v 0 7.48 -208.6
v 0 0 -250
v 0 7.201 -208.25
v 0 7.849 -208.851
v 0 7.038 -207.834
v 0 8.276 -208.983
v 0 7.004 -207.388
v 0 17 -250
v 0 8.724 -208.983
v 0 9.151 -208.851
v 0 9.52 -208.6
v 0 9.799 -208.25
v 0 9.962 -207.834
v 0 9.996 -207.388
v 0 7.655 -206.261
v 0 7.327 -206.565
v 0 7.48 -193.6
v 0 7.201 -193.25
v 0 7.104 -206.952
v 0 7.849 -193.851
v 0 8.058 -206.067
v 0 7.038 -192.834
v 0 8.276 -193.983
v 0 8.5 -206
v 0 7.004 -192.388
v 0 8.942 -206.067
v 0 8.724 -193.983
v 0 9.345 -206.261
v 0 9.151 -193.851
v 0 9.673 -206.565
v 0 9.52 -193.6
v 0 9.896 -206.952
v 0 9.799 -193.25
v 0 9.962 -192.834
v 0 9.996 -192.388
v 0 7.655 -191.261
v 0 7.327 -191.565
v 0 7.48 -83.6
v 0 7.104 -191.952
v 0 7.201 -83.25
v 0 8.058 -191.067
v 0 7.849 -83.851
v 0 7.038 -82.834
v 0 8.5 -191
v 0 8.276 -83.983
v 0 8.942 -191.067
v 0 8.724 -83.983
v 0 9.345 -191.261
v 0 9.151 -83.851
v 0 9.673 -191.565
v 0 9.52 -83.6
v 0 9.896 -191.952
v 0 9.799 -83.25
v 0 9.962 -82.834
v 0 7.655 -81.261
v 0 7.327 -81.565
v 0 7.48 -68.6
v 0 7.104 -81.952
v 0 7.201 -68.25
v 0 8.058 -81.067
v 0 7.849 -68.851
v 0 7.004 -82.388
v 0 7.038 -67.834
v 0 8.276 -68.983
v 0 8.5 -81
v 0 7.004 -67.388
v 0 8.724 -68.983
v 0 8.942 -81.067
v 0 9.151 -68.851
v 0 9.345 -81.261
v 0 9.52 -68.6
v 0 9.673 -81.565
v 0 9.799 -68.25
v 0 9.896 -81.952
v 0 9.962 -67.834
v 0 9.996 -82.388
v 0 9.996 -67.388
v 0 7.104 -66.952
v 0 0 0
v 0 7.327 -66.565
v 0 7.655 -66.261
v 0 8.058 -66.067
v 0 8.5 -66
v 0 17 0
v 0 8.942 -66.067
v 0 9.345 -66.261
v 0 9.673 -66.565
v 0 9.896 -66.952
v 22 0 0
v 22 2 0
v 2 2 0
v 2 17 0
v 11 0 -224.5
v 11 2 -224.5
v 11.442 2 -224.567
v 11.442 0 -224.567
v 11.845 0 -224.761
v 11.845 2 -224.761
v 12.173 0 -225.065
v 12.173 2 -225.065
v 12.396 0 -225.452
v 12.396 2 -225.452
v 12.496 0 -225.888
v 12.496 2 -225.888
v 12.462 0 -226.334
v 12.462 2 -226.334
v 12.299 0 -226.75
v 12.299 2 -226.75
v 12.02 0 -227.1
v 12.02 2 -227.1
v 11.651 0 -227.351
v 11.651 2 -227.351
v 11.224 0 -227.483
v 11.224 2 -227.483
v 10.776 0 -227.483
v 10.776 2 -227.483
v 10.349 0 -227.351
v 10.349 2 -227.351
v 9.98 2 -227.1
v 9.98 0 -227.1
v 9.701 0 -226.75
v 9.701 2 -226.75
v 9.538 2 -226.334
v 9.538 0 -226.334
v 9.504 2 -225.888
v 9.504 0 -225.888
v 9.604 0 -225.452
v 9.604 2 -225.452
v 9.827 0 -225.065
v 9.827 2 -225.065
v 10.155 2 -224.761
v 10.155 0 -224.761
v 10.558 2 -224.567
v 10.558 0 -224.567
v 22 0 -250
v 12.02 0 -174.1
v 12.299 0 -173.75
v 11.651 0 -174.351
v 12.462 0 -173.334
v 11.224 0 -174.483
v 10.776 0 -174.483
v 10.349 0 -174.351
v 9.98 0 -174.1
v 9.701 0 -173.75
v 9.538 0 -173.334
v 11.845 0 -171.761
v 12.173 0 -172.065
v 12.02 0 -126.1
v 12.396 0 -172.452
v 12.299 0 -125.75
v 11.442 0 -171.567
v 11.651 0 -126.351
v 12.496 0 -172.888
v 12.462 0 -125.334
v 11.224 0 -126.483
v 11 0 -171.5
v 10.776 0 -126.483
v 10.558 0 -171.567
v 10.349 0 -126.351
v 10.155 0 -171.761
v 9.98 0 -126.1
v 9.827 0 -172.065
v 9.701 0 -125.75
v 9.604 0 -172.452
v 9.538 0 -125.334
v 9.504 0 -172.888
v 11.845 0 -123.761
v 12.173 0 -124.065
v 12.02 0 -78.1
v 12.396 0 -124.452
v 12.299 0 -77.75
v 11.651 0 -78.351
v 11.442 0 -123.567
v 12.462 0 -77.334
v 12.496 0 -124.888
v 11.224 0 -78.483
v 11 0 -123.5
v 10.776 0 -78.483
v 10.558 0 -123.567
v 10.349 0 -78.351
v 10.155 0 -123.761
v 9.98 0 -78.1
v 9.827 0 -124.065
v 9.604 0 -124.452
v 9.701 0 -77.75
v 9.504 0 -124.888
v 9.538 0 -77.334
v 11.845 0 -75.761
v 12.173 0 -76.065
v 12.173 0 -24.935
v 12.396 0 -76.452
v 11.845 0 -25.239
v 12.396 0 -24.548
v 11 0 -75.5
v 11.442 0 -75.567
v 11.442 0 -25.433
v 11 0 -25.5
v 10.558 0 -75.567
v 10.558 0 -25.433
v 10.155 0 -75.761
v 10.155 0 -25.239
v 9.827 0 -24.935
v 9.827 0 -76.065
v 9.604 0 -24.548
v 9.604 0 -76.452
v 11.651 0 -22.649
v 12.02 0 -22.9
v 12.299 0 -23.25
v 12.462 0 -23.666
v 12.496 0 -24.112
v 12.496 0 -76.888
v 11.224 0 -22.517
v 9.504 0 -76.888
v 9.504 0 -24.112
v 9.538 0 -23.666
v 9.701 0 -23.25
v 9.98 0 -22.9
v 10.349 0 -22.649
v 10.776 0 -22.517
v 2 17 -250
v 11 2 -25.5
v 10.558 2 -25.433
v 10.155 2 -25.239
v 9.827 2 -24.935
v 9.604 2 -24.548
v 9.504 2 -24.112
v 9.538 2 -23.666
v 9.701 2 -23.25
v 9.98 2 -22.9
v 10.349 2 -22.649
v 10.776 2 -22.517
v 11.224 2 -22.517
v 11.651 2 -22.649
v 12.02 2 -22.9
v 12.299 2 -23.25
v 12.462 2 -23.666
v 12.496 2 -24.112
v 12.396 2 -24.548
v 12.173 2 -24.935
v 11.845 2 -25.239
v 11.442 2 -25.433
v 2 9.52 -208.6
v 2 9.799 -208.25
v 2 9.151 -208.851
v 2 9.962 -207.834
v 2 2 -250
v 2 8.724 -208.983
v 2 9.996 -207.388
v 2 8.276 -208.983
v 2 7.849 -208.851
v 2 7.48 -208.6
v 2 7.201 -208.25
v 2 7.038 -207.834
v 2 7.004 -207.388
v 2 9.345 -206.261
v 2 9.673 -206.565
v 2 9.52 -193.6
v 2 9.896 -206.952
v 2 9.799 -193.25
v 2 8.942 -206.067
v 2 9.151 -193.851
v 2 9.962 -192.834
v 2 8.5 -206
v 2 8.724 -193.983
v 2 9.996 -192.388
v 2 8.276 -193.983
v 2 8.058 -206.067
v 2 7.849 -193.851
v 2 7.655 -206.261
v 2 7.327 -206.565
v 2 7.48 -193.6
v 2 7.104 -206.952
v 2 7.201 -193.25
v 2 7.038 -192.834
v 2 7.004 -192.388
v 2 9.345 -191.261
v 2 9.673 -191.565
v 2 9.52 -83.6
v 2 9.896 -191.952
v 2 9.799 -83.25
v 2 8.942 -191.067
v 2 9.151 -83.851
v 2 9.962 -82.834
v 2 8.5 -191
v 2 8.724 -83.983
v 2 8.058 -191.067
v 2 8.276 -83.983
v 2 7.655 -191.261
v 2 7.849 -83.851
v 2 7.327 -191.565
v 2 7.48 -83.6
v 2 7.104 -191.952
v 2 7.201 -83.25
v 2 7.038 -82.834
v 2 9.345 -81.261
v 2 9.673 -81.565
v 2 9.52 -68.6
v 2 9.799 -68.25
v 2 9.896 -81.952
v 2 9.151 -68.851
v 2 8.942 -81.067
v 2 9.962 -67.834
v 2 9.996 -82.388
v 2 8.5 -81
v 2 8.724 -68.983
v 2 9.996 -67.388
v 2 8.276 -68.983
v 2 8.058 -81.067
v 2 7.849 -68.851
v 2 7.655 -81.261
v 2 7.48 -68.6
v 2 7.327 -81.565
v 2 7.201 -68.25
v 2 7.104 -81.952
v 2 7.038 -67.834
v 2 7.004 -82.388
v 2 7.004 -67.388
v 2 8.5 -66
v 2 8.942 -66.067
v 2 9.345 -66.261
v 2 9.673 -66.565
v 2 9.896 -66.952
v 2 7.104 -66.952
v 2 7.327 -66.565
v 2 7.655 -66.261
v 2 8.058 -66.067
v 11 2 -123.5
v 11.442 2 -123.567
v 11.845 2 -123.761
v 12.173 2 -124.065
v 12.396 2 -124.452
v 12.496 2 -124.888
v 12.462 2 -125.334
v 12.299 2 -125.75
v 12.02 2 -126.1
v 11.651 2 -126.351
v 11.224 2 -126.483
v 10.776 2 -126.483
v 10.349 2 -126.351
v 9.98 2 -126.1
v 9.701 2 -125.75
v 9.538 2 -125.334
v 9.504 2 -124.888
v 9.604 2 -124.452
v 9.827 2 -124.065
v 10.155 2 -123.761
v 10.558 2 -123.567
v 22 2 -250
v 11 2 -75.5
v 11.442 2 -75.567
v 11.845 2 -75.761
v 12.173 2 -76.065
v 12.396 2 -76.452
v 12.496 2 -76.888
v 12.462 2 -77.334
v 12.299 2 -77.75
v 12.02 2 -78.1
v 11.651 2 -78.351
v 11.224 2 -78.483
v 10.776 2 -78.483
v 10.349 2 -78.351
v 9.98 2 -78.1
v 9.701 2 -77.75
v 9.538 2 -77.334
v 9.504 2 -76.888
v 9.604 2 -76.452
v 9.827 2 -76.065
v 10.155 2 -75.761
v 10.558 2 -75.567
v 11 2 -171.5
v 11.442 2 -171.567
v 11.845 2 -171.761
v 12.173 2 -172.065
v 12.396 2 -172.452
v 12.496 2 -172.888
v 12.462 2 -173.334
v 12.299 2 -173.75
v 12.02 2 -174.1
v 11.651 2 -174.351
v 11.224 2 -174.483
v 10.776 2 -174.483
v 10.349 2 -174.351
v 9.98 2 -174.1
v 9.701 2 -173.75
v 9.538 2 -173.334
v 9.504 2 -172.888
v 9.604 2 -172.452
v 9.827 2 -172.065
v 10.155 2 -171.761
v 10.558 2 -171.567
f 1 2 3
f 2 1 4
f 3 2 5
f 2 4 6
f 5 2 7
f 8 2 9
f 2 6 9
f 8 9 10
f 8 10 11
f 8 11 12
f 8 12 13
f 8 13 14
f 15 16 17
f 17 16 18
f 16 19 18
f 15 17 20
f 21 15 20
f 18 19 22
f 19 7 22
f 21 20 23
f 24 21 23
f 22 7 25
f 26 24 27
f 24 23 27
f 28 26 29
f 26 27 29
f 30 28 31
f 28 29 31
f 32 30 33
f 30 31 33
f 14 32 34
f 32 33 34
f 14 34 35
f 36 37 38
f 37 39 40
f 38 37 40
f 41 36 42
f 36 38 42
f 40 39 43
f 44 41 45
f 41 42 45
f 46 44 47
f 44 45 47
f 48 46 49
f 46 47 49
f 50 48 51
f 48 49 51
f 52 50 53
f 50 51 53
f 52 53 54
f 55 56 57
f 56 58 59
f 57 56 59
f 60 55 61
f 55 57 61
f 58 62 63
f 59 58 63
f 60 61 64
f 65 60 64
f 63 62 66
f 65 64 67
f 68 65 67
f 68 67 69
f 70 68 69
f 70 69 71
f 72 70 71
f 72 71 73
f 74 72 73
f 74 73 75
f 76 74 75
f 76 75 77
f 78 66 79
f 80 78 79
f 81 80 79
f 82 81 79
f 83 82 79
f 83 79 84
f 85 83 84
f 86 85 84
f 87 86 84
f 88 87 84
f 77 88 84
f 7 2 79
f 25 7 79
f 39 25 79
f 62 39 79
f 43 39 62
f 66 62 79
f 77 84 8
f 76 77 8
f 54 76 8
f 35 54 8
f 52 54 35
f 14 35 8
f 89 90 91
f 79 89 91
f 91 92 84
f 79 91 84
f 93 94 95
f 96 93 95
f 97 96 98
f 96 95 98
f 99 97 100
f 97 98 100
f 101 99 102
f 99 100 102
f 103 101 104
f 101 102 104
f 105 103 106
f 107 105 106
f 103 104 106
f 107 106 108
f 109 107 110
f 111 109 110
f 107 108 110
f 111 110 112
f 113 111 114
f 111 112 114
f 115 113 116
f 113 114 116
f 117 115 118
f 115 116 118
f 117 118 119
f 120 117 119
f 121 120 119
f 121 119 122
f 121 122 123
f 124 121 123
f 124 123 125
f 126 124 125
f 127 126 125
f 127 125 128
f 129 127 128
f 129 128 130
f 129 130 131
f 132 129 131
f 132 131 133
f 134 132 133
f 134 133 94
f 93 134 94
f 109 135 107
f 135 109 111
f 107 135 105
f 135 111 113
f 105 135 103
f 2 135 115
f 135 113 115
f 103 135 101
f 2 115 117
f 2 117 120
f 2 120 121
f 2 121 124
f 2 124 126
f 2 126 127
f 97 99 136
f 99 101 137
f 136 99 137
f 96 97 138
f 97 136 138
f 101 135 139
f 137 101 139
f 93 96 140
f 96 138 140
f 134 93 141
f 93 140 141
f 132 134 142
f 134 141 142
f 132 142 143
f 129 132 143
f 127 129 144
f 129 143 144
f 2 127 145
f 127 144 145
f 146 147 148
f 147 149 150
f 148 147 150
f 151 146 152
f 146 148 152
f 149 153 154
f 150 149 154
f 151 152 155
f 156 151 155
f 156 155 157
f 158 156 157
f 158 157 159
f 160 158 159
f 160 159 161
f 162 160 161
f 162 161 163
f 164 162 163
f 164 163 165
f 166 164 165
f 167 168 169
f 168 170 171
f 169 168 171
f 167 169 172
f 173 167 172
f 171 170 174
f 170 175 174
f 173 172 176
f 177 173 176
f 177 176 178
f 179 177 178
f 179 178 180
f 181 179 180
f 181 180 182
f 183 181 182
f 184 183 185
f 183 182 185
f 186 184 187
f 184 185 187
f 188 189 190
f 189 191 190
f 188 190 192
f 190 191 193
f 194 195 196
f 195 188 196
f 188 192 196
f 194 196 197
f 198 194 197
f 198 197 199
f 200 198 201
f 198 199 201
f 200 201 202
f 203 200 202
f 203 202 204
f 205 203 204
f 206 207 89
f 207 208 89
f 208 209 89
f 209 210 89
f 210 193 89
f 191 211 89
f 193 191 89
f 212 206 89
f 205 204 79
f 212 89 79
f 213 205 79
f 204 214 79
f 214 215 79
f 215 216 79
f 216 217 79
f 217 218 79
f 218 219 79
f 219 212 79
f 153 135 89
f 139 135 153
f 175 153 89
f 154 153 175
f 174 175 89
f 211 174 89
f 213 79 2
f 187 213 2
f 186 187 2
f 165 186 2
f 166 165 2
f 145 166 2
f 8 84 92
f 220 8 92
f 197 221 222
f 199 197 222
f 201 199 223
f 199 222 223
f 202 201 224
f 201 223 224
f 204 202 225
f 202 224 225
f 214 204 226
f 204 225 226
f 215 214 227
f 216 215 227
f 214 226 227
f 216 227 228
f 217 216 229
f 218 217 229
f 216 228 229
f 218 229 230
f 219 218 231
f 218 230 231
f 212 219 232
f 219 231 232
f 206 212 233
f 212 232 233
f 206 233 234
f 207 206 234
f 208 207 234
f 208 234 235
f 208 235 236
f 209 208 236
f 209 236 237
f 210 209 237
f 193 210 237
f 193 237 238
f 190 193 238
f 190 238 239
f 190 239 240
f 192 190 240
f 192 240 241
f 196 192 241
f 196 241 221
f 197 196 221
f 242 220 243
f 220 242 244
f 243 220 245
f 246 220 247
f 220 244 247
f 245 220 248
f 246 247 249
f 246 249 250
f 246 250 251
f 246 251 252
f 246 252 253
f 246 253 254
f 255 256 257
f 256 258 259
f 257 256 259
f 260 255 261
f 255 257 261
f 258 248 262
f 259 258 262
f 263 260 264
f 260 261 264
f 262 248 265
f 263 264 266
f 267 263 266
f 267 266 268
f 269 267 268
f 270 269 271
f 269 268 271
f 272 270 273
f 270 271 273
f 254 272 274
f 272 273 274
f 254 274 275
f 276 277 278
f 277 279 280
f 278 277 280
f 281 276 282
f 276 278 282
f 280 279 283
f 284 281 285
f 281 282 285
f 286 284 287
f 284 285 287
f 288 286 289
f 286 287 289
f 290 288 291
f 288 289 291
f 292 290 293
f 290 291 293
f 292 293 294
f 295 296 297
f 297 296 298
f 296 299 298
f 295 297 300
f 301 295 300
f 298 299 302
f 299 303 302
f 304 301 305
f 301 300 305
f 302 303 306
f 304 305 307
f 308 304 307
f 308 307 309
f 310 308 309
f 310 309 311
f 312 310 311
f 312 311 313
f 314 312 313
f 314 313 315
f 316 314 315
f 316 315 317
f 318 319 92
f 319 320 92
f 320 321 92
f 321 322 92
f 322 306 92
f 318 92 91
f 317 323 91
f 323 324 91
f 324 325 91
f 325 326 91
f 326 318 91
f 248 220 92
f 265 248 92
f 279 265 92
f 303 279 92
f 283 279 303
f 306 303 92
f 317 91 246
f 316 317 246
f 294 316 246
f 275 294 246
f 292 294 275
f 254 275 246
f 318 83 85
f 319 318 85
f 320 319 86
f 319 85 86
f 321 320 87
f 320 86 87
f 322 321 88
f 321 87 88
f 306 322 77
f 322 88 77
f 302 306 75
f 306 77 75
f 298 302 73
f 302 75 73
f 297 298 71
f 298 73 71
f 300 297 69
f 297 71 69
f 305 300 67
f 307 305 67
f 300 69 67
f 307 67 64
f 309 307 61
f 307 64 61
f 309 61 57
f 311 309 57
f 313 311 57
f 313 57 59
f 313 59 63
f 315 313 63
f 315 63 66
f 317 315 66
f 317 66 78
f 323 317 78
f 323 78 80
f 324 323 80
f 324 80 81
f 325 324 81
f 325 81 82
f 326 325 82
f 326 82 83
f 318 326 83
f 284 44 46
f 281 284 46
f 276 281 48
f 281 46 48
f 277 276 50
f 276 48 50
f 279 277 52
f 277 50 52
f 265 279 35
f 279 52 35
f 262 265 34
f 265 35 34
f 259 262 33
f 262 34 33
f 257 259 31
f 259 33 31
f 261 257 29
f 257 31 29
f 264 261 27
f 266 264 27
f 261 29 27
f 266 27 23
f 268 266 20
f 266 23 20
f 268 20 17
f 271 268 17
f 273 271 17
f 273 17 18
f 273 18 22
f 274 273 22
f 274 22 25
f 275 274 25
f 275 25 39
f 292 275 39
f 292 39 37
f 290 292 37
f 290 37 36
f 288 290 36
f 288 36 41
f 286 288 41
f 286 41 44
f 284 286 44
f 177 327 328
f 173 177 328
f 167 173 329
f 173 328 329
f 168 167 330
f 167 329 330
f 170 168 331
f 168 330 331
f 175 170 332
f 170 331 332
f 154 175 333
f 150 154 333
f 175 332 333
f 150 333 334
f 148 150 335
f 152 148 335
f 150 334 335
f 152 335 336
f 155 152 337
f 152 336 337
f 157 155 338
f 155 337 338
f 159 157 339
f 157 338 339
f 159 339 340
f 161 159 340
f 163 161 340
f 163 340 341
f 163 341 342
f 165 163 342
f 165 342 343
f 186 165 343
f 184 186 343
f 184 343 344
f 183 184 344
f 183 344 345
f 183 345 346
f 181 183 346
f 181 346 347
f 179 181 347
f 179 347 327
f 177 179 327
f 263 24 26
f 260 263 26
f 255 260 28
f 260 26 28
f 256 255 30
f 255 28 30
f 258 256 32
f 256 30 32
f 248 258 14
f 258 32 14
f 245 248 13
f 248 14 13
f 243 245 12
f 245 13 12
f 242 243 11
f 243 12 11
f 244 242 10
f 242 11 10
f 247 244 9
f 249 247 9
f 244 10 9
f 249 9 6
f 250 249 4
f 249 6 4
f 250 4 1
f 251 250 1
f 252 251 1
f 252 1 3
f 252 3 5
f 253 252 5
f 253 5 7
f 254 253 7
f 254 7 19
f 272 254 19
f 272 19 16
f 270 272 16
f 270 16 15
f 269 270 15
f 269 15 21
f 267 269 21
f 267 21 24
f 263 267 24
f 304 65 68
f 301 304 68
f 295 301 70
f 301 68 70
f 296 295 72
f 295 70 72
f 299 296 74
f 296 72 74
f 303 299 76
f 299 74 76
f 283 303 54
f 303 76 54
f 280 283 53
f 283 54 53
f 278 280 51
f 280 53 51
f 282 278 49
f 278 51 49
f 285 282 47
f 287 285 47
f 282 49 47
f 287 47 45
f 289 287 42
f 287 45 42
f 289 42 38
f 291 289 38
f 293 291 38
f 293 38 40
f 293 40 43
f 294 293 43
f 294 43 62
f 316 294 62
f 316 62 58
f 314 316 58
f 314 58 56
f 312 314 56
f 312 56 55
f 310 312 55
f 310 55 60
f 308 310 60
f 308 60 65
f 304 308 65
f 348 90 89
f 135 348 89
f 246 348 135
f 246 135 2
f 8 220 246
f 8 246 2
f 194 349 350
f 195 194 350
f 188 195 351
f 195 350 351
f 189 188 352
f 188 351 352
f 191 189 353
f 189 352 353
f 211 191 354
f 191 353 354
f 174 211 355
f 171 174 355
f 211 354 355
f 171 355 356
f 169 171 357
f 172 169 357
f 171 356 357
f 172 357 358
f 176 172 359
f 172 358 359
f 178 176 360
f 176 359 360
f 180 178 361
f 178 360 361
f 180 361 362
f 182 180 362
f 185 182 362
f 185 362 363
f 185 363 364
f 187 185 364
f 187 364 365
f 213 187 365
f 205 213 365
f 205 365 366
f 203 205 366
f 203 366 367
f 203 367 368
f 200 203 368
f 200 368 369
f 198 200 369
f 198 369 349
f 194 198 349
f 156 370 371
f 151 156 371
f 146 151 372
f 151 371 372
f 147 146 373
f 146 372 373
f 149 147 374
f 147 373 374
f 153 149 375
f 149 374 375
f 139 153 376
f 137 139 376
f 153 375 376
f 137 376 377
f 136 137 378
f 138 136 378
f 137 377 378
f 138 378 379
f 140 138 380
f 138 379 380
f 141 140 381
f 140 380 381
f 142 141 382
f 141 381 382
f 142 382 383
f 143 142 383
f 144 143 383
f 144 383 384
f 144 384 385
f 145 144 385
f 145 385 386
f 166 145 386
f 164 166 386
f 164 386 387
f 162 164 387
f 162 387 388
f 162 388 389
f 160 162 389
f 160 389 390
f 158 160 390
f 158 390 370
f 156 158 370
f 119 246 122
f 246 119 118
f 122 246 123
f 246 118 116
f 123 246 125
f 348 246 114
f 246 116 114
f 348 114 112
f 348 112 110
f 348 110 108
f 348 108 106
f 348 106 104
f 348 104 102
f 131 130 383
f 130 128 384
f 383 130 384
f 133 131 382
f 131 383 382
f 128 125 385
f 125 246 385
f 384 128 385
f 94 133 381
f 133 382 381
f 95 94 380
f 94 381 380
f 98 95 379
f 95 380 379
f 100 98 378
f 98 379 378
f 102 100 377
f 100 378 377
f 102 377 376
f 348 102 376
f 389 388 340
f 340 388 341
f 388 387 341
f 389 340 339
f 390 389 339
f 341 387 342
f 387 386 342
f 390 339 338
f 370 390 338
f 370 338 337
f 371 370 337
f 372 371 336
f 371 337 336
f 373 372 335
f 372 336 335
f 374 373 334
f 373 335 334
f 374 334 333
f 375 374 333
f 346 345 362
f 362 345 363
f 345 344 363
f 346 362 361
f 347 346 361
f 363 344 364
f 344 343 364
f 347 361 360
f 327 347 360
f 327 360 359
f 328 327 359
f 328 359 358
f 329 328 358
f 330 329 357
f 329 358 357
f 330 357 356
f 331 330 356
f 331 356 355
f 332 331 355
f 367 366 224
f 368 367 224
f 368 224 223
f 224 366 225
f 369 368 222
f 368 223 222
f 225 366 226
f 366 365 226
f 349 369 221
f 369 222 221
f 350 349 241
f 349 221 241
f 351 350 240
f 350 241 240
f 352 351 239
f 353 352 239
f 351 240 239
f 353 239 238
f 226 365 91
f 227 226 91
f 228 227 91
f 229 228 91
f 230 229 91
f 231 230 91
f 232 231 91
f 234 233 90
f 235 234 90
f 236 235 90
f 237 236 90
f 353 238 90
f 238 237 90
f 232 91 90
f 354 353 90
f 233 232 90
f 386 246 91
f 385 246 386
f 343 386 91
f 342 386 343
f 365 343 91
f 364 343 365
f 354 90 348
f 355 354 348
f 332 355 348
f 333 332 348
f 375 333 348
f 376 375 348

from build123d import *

# Parameters (mm, degrees)
BOSS_EXTRUDE1_DEPTH = 250
SKETCH2_R           = 1.5
CUT_EXTRUDE1_DEPTH  = 20
SKETCH3_R           = 1.5
CUT_EXTRUDE2_DEPTH  = 10


with BuildPart() as part:
    # Sketch1 → Boss-Extrude1 (new body)
    with BuildSketch(Plane.XY):
        Polygon((0, 0), (0, 17), (2, 17), (2, 2), (22, 2), (22, 0), align=None)
    extrude(amount=-BOSS_EXTRUDE1_DEPTH)

    # Sketch2 → Cut-Extrude1 (cut)
    with BuildSketch(Plane(origin=(0, 2, 0), x_dir=(1, 0, 0), z_dir=(0, 1, 0))):
        with Locations(Location((11, 226, 0), (0, 0, 270))):
            Circle(SKETCH2_R)
        with Locations(Location((11, 24, 0), (0, 0, 90))):
            Circle(SKETCH2_R)
        with Locations(Location((11, 125, 0), (0, 0, 270))):
            Circle(SKETCH2_R)
        with Locations(Location((11, 173, 0), (0, 0, 270))):
            Circle(SKETCH2_R)
        with Locations(Location((11, 77, 0), (0, 0, 270))):
            Circle(SKETCH2_R)
    extrude(amount=-CUT_EXTRUDE1_DEPTH, mode=Mode.SUBTRACT)

    # Sketch3 → Cut-Extrude2 (cut)
    with BuildSketch(Plane.ZY):
        with Locations((-207.5, 8.5)):
            Circle(SKETCH3_R)
        with Locations((-192.5, 8.5)):
            Circle(SKETCH3_R)
        with Locations((-67.5, 8.5)):
            Circle(SKETCH3_R)
        with Locations((-82.5, 8.5)):
            Circle(SKETCH3_R)
    extrude(amount=-CUT_EXTRUDE2_DEPTH, mode=Mode.SUBTRACT)


solid = part.part
